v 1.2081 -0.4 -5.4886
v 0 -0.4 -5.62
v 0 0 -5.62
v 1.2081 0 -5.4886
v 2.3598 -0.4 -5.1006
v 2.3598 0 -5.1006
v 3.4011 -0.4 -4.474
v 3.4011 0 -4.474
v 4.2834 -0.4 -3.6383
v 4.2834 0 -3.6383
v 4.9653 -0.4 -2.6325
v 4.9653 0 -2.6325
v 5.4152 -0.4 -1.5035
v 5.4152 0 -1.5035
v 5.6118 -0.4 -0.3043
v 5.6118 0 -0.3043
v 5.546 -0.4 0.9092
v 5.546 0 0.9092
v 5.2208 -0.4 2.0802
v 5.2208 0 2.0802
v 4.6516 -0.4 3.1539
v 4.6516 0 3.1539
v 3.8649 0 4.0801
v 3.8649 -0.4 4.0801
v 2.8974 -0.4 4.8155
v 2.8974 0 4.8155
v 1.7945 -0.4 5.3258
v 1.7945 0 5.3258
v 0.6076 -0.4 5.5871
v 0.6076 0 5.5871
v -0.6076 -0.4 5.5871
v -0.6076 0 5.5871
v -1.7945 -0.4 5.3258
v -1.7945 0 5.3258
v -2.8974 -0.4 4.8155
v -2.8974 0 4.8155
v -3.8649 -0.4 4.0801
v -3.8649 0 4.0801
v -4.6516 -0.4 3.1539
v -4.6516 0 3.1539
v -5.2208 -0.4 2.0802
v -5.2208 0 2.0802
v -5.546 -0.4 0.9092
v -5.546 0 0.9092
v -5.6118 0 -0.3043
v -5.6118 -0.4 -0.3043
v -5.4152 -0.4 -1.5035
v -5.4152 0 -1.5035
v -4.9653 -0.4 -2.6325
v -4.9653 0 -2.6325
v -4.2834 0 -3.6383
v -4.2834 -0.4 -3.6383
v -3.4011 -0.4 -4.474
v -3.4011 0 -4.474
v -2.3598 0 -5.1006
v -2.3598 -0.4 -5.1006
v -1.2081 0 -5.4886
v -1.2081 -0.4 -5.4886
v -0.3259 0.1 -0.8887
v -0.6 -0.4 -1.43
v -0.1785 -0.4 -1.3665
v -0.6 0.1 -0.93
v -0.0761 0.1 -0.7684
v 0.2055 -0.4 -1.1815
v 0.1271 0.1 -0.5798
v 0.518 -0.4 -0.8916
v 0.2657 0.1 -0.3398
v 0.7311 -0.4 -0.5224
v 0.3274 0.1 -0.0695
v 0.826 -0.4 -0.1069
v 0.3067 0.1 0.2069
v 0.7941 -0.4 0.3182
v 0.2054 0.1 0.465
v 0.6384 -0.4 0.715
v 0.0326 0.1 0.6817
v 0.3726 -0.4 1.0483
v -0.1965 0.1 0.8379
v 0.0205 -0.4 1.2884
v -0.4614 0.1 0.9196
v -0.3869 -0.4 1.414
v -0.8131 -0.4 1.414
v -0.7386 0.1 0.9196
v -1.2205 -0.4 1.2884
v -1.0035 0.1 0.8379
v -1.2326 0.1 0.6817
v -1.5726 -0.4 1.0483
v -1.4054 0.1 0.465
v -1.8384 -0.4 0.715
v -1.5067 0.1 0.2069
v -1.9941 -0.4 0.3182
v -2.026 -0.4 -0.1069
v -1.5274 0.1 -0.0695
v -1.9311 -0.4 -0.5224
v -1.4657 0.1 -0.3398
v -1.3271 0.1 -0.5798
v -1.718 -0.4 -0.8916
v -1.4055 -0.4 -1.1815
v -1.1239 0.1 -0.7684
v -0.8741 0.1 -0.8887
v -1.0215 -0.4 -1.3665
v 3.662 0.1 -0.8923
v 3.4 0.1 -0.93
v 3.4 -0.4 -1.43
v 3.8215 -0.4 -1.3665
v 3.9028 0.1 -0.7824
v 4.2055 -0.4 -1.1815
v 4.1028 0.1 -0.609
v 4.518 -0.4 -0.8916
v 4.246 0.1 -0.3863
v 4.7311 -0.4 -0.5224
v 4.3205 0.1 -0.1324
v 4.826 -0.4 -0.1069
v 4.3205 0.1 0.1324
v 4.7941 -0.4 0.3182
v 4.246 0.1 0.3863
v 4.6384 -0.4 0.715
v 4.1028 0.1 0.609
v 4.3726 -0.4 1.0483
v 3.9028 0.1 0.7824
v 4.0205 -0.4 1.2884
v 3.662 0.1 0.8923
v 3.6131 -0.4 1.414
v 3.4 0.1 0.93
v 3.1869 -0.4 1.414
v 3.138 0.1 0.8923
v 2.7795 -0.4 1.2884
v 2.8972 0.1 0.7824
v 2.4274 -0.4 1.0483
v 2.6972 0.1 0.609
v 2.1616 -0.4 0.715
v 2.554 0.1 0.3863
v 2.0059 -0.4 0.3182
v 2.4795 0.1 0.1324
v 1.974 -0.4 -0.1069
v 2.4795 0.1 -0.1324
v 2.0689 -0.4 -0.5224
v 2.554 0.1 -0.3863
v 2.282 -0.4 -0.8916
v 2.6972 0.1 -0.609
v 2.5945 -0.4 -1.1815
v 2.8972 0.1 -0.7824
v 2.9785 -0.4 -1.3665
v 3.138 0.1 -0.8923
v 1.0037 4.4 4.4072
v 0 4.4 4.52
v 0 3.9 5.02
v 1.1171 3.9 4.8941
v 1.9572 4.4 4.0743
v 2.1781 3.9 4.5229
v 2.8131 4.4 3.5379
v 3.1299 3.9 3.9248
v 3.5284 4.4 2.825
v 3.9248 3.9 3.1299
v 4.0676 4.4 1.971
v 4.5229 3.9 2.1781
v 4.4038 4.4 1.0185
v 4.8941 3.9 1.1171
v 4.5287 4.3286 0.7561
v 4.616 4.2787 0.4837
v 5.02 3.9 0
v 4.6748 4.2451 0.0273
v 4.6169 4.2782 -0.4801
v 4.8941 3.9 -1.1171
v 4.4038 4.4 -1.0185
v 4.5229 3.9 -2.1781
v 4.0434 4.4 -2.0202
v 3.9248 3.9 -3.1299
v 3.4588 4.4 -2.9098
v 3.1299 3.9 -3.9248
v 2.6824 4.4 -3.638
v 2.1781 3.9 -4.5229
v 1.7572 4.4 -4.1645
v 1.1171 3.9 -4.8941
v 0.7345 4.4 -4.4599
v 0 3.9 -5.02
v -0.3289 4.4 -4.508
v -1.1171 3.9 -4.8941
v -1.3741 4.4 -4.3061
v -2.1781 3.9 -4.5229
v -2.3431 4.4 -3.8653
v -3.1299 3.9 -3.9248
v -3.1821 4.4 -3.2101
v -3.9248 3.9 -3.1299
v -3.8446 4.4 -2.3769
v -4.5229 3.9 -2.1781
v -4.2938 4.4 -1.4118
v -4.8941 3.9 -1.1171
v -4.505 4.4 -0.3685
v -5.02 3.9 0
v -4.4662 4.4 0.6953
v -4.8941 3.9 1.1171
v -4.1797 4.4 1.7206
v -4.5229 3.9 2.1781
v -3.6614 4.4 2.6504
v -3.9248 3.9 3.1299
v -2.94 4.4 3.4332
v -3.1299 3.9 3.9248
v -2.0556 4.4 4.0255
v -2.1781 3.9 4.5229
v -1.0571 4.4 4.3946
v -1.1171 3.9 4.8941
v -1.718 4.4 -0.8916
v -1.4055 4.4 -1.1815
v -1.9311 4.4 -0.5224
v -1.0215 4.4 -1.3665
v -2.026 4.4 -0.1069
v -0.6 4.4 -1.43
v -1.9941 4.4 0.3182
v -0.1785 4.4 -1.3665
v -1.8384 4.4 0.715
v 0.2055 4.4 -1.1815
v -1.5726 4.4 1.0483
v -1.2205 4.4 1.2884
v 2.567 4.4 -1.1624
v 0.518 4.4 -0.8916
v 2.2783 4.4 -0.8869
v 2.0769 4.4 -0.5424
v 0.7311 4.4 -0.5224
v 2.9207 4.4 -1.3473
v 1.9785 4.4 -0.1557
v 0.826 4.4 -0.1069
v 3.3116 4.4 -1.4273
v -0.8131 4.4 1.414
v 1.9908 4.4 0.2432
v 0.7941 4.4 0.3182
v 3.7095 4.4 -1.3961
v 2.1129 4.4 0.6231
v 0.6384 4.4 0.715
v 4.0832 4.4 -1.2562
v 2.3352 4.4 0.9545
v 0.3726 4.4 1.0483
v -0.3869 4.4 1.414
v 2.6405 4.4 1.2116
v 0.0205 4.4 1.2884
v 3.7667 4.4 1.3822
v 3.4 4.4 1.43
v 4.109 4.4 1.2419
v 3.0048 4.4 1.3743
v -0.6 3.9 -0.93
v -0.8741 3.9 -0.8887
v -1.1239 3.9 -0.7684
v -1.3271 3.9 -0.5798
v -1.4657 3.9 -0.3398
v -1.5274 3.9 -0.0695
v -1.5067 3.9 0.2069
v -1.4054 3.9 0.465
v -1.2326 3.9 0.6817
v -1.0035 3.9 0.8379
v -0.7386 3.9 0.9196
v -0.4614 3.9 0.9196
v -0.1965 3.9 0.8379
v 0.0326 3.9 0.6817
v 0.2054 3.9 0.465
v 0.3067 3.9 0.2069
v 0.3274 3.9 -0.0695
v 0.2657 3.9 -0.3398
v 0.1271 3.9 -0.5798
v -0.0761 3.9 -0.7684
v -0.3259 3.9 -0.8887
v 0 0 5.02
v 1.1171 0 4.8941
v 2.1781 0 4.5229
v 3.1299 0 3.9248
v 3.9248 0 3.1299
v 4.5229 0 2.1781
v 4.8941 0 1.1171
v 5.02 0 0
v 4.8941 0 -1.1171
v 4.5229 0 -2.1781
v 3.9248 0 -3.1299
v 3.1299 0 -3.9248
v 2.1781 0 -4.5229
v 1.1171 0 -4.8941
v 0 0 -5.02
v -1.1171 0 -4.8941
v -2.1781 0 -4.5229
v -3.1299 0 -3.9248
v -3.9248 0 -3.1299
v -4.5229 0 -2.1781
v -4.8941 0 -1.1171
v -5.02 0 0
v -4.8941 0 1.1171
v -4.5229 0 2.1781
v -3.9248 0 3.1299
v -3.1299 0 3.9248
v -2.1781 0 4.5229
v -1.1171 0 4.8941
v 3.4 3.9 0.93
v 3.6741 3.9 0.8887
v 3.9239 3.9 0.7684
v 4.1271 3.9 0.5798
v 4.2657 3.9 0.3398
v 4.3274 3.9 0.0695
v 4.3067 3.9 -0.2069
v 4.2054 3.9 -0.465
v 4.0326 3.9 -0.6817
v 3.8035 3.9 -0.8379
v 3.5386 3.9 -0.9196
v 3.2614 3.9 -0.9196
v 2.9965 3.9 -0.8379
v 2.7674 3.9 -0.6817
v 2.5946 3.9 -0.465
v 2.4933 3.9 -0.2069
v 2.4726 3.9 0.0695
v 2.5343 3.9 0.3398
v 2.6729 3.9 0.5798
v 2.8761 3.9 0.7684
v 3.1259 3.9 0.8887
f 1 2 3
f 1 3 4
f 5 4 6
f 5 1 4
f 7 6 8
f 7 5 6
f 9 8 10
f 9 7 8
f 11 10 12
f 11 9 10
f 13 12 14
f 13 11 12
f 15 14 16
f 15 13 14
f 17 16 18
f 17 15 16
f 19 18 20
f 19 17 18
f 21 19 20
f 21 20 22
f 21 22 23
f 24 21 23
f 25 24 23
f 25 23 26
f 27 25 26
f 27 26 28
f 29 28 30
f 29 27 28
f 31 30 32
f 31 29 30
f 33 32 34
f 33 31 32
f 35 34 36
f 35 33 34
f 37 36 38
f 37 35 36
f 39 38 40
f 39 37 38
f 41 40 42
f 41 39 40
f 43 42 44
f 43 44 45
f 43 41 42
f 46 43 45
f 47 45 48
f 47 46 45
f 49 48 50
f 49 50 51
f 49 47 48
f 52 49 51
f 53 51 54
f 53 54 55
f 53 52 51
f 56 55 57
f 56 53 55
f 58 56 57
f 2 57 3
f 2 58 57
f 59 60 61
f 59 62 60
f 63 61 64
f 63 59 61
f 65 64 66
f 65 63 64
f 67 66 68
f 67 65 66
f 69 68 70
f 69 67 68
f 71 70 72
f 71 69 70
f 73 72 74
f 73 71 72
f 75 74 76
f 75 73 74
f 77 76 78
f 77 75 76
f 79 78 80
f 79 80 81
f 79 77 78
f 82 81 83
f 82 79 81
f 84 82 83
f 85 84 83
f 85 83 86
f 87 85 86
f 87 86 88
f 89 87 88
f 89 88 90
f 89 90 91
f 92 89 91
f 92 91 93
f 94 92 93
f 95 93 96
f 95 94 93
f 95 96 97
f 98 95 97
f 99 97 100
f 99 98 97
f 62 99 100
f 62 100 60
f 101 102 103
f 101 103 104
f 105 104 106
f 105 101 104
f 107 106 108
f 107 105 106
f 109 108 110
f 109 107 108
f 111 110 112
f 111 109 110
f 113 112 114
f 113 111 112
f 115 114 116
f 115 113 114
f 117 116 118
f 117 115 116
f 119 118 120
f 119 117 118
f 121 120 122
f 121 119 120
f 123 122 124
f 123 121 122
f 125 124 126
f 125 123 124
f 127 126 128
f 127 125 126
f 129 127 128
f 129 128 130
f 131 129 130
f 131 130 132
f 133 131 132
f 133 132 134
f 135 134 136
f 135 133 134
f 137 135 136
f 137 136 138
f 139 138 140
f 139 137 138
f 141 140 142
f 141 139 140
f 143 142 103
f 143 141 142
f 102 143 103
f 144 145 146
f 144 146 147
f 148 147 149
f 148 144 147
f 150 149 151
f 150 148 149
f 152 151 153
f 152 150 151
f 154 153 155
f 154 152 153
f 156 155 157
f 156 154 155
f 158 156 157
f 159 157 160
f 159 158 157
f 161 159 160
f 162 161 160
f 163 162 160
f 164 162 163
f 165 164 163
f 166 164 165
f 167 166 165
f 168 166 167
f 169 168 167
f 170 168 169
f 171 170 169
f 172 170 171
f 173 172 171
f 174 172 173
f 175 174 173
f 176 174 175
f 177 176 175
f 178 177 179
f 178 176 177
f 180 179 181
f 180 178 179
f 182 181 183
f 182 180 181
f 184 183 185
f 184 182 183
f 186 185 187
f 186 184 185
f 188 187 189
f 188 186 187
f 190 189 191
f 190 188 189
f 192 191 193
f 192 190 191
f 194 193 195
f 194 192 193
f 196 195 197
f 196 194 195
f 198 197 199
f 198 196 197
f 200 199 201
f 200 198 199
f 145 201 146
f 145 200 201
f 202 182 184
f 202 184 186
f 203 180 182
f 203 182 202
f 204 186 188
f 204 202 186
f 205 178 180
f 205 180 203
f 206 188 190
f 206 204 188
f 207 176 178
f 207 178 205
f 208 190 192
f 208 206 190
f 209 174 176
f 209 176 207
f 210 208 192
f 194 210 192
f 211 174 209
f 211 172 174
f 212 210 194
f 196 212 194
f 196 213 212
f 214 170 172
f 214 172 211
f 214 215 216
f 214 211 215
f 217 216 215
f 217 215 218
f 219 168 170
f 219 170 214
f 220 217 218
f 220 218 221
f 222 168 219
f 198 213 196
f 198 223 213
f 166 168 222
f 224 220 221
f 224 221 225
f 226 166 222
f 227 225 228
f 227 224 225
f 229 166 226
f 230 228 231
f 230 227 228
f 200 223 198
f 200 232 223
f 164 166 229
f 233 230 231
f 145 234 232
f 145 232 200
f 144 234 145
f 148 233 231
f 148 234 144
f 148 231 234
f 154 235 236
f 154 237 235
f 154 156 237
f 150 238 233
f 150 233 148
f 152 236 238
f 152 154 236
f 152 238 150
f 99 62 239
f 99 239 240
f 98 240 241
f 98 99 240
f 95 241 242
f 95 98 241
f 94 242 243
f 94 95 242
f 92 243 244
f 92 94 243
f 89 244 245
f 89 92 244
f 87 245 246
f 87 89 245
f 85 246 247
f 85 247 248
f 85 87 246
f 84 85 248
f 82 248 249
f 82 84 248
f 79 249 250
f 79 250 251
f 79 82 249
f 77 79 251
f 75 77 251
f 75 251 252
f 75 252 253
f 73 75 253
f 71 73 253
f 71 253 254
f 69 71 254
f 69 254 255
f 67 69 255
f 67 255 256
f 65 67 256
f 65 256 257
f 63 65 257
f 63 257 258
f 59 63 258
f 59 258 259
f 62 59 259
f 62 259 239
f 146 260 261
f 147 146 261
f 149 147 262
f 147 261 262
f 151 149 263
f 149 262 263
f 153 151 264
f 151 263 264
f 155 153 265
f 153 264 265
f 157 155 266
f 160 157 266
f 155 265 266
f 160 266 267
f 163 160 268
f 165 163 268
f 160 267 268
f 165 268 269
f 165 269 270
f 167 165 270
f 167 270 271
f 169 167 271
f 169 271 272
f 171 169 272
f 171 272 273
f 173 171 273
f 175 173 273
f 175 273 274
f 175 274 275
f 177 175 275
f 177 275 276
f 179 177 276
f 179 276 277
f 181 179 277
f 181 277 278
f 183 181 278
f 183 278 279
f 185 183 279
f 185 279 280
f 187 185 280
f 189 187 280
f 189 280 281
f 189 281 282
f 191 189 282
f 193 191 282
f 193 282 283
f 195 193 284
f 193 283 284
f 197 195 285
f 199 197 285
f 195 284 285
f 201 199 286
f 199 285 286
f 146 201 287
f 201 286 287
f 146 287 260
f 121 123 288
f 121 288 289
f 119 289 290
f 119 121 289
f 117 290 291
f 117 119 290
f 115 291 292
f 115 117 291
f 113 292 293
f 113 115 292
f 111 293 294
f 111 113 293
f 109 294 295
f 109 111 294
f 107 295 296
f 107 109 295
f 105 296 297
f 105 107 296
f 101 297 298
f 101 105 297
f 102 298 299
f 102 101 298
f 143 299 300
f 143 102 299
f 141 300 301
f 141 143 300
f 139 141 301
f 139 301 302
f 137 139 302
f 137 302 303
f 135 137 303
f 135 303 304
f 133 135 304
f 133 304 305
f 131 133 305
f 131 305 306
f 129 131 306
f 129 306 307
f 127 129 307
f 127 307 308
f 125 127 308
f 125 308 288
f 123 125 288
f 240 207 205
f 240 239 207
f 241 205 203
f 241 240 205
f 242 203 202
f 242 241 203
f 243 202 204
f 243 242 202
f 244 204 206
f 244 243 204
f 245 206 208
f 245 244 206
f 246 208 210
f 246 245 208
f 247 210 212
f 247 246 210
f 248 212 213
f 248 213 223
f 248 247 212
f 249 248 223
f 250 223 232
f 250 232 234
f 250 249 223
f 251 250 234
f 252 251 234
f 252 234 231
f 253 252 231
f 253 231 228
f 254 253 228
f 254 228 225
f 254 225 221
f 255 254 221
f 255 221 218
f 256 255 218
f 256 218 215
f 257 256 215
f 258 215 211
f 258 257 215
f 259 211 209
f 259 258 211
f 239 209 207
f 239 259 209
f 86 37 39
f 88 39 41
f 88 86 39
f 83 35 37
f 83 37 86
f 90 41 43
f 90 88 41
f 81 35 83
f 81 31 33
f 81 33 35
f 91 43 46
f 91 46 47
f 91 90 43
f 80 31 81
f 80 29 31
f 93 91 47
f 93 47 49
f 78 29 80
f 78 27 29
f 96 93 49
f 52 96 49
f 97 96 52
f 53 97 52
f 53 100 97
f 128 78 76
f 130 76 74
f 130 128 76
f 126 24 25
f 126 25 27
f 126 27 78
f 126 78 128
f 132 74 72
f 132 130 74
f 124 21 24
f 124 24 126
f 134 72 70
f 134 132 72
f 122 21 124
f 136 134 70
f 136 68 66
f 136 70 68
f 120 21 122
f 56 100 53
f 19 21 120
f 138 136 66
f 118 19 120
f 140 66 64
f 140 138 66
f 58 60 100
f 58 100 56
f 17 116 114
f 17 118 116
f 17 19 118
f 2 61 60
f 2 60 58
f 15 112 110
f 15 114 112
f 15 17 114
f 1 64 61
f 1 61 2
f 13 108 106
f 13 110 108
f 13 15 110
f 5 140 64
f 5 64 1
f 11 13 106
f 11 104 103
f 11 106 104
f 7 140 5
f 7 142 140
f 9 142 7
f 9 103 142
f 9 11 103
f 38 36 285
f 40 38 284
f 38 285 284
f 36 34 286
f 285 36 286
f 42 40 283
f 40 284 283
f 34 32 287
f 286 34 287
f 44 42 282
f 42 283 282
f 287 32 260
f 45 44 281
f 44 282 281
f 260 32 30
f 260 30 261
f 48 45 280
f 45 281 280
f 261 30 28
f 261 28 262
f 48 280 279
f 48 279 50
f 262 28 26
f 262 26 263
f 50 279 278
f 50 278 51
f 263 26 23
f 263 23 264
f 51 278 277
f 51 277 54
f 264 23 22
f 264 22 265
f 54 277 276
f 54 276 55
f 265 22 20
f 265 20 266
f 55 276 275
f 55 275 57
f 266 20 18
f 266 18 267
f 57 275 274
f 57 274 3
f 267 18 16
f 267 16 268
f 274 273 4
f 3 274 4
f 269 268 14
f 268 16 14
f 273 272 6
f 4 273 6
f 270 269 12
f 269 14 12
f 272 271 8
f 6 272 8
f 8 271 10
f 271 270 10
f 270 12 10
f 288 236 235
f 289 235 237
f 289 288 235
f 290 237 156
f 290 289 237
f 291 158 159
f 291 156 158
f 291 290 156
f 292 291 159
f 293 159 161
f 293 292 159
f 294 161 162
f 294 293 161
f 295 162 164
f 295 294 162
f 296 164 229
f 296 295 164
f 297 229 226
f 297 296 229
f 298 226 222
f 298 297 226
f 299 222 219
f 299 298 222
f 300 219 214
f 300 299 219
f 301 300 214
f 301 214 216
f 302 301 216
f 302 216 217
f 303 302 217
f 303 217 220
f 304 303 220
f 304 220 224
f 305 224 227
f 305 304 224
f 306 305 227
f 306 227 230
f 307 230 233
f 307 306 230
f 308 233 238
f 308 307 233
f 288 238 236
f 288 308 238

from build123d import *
from build123d.topology import SkipClean

# Parameters (mm, degrees)
SKETCH_1_R      = 5.02
SKETCH_1_R_2    = 0.93
EXTRUDE_1_DEPTH = 4.4
EXTRUDE_START   = 0.4
SKETCH_3_R      = 5.62
SKETCH_3_R_2    = 0.93
EXTRUDE_2_DEPTH = 0.4
CHAMFER_1_SIZE  = 0.5


with BuildPart() as part:
    # 草图1 → 凸台-拉伸1 (new body)
    with BuildSketch(Plane(origin=(0, 0, 0), x_dir=(1, 0, 0), z_dir=(0, 1, 0))):
        with Locations(Location((0, 0, 0), (0, 0, 270))):
            Circle(SKETCH_1_R)
        with Locations(Location((3.4, 0, 0), (0, 0, 270))):
            Circle(SKETCH_1_R_2, mode=Mode.SUBTRACT)
        with Locations(Location((-0.6, 0, 0), (0, 0, 90))):
            Circle(SKETCH_1_R_2, mode=Mode.SUBTRACT)
    extrude(amount=EXTRUDE_1_DEPTH)

    # 草图3 → 凸台-拉伸2 (add)
    with SkipClean():  # the faces are left unmerged after this step: merging them gives an invalid solid
        with BuildSketch(Plane.XZ.offset(EXTRUDE_START)):
            with Locations(Location((0, 0, 0), (0, 0, 270))):
                Circle(SKETCH_3_R)
            with Locations(Location((3.4, 0, 0), (0, 0, 270))):
                Circle(SKETCH_3_R_2, mode=Mode.SUBTRACT)
            with Locations(Location((-0.6, 0, 0), (0, 0, 270))):
                Circle(SKETCH_3_R_2, mode=Mode.SUBTRACT)
        extrude(amount=-EXTRUDE_2_DEPTH)

    # 倒角1
    # the kernel refuses this chamfer: 0.5 mm, written as the material it takes off along each edge
    with BuildSketch(Plane(origin=(3.4, -0.4, 0), x_dir=(0, 0, -1), z_dir=(-1, 0, 0))) as chamfer_1_piece_1:
        Polygon((0.93 + CHAMFER_1_SIZE, 0), (0.93, -CHAMFER_1_SIZE), (0.93, 0), align=None)
    revolve(axis=Axis((3.4, -0.4, 0), (0, -1, 0)), mode=Mode.SUBTRACT)
    with BuildSketch(Plane(origin=(-0.6, -0.4, 0), x_dir=(0, 0, -1), z_dir=(-1, 0, 0))) as chamfer_1_piece_2:
        Polygon((0.93 + CHAMFER_1_SIZE, 0), (0.93, -CHAMFER_1_SIZE), (0.93, 0), align=None)
    revolve(axis=Axis((-0.6, -0.4, 0), (0, -1, 0)), mode=Mode.SUBTRACT)
    with BuildSketch(Plane(origin=(0, 4.4, 0), x_dir=(0, 0, 1), z_dir=(-1, 0, 0))) as chamfer_1_piece_3:
        Polygon((5.02, -CHAMFER_1_SIZE), (5.02 - CHAMFER_1_SIZE, 0), (5.02, 0), align=None)
    revolve(axis=Axis((0, 4.4, 0), (0, 1, 0)), mode=Mode.SUBTRACT)
    with BuildSketch(Plane(origin=(3.4, 4.4, 0), x_dir=(0, 0, 1), z_dir=(-1, 0, 0))) as chamfer_1_piece_4:
        Polygon((0.93 + CHAMFER_1_SIZE, 0), (0.93, -CHAMFER_1_SIZE), (0.93, 0), align=None)
    revolve(axis=Axis((3.4, 4.4, 0), (0, 1, 0)), mode=Mode.SUBTRACT)
    with BuildSketch(Plane(origin=(-0.6, 4.4, 0), x_dir=(0, 0, -1), z_dir=(1, 0, 0))) as chamfer_1_piece_5:
        Polygon((0.93 + CHAMFER_1_SIZE, 0), (0.93, -CHAMFER_1_SIZE), (0.93, 0), align=None)
    revolve(axis=Axis((-0.6, 4.4, 0), (0, 1, 0)), mode=Mode.SUBTRACT)


solid = part.part
